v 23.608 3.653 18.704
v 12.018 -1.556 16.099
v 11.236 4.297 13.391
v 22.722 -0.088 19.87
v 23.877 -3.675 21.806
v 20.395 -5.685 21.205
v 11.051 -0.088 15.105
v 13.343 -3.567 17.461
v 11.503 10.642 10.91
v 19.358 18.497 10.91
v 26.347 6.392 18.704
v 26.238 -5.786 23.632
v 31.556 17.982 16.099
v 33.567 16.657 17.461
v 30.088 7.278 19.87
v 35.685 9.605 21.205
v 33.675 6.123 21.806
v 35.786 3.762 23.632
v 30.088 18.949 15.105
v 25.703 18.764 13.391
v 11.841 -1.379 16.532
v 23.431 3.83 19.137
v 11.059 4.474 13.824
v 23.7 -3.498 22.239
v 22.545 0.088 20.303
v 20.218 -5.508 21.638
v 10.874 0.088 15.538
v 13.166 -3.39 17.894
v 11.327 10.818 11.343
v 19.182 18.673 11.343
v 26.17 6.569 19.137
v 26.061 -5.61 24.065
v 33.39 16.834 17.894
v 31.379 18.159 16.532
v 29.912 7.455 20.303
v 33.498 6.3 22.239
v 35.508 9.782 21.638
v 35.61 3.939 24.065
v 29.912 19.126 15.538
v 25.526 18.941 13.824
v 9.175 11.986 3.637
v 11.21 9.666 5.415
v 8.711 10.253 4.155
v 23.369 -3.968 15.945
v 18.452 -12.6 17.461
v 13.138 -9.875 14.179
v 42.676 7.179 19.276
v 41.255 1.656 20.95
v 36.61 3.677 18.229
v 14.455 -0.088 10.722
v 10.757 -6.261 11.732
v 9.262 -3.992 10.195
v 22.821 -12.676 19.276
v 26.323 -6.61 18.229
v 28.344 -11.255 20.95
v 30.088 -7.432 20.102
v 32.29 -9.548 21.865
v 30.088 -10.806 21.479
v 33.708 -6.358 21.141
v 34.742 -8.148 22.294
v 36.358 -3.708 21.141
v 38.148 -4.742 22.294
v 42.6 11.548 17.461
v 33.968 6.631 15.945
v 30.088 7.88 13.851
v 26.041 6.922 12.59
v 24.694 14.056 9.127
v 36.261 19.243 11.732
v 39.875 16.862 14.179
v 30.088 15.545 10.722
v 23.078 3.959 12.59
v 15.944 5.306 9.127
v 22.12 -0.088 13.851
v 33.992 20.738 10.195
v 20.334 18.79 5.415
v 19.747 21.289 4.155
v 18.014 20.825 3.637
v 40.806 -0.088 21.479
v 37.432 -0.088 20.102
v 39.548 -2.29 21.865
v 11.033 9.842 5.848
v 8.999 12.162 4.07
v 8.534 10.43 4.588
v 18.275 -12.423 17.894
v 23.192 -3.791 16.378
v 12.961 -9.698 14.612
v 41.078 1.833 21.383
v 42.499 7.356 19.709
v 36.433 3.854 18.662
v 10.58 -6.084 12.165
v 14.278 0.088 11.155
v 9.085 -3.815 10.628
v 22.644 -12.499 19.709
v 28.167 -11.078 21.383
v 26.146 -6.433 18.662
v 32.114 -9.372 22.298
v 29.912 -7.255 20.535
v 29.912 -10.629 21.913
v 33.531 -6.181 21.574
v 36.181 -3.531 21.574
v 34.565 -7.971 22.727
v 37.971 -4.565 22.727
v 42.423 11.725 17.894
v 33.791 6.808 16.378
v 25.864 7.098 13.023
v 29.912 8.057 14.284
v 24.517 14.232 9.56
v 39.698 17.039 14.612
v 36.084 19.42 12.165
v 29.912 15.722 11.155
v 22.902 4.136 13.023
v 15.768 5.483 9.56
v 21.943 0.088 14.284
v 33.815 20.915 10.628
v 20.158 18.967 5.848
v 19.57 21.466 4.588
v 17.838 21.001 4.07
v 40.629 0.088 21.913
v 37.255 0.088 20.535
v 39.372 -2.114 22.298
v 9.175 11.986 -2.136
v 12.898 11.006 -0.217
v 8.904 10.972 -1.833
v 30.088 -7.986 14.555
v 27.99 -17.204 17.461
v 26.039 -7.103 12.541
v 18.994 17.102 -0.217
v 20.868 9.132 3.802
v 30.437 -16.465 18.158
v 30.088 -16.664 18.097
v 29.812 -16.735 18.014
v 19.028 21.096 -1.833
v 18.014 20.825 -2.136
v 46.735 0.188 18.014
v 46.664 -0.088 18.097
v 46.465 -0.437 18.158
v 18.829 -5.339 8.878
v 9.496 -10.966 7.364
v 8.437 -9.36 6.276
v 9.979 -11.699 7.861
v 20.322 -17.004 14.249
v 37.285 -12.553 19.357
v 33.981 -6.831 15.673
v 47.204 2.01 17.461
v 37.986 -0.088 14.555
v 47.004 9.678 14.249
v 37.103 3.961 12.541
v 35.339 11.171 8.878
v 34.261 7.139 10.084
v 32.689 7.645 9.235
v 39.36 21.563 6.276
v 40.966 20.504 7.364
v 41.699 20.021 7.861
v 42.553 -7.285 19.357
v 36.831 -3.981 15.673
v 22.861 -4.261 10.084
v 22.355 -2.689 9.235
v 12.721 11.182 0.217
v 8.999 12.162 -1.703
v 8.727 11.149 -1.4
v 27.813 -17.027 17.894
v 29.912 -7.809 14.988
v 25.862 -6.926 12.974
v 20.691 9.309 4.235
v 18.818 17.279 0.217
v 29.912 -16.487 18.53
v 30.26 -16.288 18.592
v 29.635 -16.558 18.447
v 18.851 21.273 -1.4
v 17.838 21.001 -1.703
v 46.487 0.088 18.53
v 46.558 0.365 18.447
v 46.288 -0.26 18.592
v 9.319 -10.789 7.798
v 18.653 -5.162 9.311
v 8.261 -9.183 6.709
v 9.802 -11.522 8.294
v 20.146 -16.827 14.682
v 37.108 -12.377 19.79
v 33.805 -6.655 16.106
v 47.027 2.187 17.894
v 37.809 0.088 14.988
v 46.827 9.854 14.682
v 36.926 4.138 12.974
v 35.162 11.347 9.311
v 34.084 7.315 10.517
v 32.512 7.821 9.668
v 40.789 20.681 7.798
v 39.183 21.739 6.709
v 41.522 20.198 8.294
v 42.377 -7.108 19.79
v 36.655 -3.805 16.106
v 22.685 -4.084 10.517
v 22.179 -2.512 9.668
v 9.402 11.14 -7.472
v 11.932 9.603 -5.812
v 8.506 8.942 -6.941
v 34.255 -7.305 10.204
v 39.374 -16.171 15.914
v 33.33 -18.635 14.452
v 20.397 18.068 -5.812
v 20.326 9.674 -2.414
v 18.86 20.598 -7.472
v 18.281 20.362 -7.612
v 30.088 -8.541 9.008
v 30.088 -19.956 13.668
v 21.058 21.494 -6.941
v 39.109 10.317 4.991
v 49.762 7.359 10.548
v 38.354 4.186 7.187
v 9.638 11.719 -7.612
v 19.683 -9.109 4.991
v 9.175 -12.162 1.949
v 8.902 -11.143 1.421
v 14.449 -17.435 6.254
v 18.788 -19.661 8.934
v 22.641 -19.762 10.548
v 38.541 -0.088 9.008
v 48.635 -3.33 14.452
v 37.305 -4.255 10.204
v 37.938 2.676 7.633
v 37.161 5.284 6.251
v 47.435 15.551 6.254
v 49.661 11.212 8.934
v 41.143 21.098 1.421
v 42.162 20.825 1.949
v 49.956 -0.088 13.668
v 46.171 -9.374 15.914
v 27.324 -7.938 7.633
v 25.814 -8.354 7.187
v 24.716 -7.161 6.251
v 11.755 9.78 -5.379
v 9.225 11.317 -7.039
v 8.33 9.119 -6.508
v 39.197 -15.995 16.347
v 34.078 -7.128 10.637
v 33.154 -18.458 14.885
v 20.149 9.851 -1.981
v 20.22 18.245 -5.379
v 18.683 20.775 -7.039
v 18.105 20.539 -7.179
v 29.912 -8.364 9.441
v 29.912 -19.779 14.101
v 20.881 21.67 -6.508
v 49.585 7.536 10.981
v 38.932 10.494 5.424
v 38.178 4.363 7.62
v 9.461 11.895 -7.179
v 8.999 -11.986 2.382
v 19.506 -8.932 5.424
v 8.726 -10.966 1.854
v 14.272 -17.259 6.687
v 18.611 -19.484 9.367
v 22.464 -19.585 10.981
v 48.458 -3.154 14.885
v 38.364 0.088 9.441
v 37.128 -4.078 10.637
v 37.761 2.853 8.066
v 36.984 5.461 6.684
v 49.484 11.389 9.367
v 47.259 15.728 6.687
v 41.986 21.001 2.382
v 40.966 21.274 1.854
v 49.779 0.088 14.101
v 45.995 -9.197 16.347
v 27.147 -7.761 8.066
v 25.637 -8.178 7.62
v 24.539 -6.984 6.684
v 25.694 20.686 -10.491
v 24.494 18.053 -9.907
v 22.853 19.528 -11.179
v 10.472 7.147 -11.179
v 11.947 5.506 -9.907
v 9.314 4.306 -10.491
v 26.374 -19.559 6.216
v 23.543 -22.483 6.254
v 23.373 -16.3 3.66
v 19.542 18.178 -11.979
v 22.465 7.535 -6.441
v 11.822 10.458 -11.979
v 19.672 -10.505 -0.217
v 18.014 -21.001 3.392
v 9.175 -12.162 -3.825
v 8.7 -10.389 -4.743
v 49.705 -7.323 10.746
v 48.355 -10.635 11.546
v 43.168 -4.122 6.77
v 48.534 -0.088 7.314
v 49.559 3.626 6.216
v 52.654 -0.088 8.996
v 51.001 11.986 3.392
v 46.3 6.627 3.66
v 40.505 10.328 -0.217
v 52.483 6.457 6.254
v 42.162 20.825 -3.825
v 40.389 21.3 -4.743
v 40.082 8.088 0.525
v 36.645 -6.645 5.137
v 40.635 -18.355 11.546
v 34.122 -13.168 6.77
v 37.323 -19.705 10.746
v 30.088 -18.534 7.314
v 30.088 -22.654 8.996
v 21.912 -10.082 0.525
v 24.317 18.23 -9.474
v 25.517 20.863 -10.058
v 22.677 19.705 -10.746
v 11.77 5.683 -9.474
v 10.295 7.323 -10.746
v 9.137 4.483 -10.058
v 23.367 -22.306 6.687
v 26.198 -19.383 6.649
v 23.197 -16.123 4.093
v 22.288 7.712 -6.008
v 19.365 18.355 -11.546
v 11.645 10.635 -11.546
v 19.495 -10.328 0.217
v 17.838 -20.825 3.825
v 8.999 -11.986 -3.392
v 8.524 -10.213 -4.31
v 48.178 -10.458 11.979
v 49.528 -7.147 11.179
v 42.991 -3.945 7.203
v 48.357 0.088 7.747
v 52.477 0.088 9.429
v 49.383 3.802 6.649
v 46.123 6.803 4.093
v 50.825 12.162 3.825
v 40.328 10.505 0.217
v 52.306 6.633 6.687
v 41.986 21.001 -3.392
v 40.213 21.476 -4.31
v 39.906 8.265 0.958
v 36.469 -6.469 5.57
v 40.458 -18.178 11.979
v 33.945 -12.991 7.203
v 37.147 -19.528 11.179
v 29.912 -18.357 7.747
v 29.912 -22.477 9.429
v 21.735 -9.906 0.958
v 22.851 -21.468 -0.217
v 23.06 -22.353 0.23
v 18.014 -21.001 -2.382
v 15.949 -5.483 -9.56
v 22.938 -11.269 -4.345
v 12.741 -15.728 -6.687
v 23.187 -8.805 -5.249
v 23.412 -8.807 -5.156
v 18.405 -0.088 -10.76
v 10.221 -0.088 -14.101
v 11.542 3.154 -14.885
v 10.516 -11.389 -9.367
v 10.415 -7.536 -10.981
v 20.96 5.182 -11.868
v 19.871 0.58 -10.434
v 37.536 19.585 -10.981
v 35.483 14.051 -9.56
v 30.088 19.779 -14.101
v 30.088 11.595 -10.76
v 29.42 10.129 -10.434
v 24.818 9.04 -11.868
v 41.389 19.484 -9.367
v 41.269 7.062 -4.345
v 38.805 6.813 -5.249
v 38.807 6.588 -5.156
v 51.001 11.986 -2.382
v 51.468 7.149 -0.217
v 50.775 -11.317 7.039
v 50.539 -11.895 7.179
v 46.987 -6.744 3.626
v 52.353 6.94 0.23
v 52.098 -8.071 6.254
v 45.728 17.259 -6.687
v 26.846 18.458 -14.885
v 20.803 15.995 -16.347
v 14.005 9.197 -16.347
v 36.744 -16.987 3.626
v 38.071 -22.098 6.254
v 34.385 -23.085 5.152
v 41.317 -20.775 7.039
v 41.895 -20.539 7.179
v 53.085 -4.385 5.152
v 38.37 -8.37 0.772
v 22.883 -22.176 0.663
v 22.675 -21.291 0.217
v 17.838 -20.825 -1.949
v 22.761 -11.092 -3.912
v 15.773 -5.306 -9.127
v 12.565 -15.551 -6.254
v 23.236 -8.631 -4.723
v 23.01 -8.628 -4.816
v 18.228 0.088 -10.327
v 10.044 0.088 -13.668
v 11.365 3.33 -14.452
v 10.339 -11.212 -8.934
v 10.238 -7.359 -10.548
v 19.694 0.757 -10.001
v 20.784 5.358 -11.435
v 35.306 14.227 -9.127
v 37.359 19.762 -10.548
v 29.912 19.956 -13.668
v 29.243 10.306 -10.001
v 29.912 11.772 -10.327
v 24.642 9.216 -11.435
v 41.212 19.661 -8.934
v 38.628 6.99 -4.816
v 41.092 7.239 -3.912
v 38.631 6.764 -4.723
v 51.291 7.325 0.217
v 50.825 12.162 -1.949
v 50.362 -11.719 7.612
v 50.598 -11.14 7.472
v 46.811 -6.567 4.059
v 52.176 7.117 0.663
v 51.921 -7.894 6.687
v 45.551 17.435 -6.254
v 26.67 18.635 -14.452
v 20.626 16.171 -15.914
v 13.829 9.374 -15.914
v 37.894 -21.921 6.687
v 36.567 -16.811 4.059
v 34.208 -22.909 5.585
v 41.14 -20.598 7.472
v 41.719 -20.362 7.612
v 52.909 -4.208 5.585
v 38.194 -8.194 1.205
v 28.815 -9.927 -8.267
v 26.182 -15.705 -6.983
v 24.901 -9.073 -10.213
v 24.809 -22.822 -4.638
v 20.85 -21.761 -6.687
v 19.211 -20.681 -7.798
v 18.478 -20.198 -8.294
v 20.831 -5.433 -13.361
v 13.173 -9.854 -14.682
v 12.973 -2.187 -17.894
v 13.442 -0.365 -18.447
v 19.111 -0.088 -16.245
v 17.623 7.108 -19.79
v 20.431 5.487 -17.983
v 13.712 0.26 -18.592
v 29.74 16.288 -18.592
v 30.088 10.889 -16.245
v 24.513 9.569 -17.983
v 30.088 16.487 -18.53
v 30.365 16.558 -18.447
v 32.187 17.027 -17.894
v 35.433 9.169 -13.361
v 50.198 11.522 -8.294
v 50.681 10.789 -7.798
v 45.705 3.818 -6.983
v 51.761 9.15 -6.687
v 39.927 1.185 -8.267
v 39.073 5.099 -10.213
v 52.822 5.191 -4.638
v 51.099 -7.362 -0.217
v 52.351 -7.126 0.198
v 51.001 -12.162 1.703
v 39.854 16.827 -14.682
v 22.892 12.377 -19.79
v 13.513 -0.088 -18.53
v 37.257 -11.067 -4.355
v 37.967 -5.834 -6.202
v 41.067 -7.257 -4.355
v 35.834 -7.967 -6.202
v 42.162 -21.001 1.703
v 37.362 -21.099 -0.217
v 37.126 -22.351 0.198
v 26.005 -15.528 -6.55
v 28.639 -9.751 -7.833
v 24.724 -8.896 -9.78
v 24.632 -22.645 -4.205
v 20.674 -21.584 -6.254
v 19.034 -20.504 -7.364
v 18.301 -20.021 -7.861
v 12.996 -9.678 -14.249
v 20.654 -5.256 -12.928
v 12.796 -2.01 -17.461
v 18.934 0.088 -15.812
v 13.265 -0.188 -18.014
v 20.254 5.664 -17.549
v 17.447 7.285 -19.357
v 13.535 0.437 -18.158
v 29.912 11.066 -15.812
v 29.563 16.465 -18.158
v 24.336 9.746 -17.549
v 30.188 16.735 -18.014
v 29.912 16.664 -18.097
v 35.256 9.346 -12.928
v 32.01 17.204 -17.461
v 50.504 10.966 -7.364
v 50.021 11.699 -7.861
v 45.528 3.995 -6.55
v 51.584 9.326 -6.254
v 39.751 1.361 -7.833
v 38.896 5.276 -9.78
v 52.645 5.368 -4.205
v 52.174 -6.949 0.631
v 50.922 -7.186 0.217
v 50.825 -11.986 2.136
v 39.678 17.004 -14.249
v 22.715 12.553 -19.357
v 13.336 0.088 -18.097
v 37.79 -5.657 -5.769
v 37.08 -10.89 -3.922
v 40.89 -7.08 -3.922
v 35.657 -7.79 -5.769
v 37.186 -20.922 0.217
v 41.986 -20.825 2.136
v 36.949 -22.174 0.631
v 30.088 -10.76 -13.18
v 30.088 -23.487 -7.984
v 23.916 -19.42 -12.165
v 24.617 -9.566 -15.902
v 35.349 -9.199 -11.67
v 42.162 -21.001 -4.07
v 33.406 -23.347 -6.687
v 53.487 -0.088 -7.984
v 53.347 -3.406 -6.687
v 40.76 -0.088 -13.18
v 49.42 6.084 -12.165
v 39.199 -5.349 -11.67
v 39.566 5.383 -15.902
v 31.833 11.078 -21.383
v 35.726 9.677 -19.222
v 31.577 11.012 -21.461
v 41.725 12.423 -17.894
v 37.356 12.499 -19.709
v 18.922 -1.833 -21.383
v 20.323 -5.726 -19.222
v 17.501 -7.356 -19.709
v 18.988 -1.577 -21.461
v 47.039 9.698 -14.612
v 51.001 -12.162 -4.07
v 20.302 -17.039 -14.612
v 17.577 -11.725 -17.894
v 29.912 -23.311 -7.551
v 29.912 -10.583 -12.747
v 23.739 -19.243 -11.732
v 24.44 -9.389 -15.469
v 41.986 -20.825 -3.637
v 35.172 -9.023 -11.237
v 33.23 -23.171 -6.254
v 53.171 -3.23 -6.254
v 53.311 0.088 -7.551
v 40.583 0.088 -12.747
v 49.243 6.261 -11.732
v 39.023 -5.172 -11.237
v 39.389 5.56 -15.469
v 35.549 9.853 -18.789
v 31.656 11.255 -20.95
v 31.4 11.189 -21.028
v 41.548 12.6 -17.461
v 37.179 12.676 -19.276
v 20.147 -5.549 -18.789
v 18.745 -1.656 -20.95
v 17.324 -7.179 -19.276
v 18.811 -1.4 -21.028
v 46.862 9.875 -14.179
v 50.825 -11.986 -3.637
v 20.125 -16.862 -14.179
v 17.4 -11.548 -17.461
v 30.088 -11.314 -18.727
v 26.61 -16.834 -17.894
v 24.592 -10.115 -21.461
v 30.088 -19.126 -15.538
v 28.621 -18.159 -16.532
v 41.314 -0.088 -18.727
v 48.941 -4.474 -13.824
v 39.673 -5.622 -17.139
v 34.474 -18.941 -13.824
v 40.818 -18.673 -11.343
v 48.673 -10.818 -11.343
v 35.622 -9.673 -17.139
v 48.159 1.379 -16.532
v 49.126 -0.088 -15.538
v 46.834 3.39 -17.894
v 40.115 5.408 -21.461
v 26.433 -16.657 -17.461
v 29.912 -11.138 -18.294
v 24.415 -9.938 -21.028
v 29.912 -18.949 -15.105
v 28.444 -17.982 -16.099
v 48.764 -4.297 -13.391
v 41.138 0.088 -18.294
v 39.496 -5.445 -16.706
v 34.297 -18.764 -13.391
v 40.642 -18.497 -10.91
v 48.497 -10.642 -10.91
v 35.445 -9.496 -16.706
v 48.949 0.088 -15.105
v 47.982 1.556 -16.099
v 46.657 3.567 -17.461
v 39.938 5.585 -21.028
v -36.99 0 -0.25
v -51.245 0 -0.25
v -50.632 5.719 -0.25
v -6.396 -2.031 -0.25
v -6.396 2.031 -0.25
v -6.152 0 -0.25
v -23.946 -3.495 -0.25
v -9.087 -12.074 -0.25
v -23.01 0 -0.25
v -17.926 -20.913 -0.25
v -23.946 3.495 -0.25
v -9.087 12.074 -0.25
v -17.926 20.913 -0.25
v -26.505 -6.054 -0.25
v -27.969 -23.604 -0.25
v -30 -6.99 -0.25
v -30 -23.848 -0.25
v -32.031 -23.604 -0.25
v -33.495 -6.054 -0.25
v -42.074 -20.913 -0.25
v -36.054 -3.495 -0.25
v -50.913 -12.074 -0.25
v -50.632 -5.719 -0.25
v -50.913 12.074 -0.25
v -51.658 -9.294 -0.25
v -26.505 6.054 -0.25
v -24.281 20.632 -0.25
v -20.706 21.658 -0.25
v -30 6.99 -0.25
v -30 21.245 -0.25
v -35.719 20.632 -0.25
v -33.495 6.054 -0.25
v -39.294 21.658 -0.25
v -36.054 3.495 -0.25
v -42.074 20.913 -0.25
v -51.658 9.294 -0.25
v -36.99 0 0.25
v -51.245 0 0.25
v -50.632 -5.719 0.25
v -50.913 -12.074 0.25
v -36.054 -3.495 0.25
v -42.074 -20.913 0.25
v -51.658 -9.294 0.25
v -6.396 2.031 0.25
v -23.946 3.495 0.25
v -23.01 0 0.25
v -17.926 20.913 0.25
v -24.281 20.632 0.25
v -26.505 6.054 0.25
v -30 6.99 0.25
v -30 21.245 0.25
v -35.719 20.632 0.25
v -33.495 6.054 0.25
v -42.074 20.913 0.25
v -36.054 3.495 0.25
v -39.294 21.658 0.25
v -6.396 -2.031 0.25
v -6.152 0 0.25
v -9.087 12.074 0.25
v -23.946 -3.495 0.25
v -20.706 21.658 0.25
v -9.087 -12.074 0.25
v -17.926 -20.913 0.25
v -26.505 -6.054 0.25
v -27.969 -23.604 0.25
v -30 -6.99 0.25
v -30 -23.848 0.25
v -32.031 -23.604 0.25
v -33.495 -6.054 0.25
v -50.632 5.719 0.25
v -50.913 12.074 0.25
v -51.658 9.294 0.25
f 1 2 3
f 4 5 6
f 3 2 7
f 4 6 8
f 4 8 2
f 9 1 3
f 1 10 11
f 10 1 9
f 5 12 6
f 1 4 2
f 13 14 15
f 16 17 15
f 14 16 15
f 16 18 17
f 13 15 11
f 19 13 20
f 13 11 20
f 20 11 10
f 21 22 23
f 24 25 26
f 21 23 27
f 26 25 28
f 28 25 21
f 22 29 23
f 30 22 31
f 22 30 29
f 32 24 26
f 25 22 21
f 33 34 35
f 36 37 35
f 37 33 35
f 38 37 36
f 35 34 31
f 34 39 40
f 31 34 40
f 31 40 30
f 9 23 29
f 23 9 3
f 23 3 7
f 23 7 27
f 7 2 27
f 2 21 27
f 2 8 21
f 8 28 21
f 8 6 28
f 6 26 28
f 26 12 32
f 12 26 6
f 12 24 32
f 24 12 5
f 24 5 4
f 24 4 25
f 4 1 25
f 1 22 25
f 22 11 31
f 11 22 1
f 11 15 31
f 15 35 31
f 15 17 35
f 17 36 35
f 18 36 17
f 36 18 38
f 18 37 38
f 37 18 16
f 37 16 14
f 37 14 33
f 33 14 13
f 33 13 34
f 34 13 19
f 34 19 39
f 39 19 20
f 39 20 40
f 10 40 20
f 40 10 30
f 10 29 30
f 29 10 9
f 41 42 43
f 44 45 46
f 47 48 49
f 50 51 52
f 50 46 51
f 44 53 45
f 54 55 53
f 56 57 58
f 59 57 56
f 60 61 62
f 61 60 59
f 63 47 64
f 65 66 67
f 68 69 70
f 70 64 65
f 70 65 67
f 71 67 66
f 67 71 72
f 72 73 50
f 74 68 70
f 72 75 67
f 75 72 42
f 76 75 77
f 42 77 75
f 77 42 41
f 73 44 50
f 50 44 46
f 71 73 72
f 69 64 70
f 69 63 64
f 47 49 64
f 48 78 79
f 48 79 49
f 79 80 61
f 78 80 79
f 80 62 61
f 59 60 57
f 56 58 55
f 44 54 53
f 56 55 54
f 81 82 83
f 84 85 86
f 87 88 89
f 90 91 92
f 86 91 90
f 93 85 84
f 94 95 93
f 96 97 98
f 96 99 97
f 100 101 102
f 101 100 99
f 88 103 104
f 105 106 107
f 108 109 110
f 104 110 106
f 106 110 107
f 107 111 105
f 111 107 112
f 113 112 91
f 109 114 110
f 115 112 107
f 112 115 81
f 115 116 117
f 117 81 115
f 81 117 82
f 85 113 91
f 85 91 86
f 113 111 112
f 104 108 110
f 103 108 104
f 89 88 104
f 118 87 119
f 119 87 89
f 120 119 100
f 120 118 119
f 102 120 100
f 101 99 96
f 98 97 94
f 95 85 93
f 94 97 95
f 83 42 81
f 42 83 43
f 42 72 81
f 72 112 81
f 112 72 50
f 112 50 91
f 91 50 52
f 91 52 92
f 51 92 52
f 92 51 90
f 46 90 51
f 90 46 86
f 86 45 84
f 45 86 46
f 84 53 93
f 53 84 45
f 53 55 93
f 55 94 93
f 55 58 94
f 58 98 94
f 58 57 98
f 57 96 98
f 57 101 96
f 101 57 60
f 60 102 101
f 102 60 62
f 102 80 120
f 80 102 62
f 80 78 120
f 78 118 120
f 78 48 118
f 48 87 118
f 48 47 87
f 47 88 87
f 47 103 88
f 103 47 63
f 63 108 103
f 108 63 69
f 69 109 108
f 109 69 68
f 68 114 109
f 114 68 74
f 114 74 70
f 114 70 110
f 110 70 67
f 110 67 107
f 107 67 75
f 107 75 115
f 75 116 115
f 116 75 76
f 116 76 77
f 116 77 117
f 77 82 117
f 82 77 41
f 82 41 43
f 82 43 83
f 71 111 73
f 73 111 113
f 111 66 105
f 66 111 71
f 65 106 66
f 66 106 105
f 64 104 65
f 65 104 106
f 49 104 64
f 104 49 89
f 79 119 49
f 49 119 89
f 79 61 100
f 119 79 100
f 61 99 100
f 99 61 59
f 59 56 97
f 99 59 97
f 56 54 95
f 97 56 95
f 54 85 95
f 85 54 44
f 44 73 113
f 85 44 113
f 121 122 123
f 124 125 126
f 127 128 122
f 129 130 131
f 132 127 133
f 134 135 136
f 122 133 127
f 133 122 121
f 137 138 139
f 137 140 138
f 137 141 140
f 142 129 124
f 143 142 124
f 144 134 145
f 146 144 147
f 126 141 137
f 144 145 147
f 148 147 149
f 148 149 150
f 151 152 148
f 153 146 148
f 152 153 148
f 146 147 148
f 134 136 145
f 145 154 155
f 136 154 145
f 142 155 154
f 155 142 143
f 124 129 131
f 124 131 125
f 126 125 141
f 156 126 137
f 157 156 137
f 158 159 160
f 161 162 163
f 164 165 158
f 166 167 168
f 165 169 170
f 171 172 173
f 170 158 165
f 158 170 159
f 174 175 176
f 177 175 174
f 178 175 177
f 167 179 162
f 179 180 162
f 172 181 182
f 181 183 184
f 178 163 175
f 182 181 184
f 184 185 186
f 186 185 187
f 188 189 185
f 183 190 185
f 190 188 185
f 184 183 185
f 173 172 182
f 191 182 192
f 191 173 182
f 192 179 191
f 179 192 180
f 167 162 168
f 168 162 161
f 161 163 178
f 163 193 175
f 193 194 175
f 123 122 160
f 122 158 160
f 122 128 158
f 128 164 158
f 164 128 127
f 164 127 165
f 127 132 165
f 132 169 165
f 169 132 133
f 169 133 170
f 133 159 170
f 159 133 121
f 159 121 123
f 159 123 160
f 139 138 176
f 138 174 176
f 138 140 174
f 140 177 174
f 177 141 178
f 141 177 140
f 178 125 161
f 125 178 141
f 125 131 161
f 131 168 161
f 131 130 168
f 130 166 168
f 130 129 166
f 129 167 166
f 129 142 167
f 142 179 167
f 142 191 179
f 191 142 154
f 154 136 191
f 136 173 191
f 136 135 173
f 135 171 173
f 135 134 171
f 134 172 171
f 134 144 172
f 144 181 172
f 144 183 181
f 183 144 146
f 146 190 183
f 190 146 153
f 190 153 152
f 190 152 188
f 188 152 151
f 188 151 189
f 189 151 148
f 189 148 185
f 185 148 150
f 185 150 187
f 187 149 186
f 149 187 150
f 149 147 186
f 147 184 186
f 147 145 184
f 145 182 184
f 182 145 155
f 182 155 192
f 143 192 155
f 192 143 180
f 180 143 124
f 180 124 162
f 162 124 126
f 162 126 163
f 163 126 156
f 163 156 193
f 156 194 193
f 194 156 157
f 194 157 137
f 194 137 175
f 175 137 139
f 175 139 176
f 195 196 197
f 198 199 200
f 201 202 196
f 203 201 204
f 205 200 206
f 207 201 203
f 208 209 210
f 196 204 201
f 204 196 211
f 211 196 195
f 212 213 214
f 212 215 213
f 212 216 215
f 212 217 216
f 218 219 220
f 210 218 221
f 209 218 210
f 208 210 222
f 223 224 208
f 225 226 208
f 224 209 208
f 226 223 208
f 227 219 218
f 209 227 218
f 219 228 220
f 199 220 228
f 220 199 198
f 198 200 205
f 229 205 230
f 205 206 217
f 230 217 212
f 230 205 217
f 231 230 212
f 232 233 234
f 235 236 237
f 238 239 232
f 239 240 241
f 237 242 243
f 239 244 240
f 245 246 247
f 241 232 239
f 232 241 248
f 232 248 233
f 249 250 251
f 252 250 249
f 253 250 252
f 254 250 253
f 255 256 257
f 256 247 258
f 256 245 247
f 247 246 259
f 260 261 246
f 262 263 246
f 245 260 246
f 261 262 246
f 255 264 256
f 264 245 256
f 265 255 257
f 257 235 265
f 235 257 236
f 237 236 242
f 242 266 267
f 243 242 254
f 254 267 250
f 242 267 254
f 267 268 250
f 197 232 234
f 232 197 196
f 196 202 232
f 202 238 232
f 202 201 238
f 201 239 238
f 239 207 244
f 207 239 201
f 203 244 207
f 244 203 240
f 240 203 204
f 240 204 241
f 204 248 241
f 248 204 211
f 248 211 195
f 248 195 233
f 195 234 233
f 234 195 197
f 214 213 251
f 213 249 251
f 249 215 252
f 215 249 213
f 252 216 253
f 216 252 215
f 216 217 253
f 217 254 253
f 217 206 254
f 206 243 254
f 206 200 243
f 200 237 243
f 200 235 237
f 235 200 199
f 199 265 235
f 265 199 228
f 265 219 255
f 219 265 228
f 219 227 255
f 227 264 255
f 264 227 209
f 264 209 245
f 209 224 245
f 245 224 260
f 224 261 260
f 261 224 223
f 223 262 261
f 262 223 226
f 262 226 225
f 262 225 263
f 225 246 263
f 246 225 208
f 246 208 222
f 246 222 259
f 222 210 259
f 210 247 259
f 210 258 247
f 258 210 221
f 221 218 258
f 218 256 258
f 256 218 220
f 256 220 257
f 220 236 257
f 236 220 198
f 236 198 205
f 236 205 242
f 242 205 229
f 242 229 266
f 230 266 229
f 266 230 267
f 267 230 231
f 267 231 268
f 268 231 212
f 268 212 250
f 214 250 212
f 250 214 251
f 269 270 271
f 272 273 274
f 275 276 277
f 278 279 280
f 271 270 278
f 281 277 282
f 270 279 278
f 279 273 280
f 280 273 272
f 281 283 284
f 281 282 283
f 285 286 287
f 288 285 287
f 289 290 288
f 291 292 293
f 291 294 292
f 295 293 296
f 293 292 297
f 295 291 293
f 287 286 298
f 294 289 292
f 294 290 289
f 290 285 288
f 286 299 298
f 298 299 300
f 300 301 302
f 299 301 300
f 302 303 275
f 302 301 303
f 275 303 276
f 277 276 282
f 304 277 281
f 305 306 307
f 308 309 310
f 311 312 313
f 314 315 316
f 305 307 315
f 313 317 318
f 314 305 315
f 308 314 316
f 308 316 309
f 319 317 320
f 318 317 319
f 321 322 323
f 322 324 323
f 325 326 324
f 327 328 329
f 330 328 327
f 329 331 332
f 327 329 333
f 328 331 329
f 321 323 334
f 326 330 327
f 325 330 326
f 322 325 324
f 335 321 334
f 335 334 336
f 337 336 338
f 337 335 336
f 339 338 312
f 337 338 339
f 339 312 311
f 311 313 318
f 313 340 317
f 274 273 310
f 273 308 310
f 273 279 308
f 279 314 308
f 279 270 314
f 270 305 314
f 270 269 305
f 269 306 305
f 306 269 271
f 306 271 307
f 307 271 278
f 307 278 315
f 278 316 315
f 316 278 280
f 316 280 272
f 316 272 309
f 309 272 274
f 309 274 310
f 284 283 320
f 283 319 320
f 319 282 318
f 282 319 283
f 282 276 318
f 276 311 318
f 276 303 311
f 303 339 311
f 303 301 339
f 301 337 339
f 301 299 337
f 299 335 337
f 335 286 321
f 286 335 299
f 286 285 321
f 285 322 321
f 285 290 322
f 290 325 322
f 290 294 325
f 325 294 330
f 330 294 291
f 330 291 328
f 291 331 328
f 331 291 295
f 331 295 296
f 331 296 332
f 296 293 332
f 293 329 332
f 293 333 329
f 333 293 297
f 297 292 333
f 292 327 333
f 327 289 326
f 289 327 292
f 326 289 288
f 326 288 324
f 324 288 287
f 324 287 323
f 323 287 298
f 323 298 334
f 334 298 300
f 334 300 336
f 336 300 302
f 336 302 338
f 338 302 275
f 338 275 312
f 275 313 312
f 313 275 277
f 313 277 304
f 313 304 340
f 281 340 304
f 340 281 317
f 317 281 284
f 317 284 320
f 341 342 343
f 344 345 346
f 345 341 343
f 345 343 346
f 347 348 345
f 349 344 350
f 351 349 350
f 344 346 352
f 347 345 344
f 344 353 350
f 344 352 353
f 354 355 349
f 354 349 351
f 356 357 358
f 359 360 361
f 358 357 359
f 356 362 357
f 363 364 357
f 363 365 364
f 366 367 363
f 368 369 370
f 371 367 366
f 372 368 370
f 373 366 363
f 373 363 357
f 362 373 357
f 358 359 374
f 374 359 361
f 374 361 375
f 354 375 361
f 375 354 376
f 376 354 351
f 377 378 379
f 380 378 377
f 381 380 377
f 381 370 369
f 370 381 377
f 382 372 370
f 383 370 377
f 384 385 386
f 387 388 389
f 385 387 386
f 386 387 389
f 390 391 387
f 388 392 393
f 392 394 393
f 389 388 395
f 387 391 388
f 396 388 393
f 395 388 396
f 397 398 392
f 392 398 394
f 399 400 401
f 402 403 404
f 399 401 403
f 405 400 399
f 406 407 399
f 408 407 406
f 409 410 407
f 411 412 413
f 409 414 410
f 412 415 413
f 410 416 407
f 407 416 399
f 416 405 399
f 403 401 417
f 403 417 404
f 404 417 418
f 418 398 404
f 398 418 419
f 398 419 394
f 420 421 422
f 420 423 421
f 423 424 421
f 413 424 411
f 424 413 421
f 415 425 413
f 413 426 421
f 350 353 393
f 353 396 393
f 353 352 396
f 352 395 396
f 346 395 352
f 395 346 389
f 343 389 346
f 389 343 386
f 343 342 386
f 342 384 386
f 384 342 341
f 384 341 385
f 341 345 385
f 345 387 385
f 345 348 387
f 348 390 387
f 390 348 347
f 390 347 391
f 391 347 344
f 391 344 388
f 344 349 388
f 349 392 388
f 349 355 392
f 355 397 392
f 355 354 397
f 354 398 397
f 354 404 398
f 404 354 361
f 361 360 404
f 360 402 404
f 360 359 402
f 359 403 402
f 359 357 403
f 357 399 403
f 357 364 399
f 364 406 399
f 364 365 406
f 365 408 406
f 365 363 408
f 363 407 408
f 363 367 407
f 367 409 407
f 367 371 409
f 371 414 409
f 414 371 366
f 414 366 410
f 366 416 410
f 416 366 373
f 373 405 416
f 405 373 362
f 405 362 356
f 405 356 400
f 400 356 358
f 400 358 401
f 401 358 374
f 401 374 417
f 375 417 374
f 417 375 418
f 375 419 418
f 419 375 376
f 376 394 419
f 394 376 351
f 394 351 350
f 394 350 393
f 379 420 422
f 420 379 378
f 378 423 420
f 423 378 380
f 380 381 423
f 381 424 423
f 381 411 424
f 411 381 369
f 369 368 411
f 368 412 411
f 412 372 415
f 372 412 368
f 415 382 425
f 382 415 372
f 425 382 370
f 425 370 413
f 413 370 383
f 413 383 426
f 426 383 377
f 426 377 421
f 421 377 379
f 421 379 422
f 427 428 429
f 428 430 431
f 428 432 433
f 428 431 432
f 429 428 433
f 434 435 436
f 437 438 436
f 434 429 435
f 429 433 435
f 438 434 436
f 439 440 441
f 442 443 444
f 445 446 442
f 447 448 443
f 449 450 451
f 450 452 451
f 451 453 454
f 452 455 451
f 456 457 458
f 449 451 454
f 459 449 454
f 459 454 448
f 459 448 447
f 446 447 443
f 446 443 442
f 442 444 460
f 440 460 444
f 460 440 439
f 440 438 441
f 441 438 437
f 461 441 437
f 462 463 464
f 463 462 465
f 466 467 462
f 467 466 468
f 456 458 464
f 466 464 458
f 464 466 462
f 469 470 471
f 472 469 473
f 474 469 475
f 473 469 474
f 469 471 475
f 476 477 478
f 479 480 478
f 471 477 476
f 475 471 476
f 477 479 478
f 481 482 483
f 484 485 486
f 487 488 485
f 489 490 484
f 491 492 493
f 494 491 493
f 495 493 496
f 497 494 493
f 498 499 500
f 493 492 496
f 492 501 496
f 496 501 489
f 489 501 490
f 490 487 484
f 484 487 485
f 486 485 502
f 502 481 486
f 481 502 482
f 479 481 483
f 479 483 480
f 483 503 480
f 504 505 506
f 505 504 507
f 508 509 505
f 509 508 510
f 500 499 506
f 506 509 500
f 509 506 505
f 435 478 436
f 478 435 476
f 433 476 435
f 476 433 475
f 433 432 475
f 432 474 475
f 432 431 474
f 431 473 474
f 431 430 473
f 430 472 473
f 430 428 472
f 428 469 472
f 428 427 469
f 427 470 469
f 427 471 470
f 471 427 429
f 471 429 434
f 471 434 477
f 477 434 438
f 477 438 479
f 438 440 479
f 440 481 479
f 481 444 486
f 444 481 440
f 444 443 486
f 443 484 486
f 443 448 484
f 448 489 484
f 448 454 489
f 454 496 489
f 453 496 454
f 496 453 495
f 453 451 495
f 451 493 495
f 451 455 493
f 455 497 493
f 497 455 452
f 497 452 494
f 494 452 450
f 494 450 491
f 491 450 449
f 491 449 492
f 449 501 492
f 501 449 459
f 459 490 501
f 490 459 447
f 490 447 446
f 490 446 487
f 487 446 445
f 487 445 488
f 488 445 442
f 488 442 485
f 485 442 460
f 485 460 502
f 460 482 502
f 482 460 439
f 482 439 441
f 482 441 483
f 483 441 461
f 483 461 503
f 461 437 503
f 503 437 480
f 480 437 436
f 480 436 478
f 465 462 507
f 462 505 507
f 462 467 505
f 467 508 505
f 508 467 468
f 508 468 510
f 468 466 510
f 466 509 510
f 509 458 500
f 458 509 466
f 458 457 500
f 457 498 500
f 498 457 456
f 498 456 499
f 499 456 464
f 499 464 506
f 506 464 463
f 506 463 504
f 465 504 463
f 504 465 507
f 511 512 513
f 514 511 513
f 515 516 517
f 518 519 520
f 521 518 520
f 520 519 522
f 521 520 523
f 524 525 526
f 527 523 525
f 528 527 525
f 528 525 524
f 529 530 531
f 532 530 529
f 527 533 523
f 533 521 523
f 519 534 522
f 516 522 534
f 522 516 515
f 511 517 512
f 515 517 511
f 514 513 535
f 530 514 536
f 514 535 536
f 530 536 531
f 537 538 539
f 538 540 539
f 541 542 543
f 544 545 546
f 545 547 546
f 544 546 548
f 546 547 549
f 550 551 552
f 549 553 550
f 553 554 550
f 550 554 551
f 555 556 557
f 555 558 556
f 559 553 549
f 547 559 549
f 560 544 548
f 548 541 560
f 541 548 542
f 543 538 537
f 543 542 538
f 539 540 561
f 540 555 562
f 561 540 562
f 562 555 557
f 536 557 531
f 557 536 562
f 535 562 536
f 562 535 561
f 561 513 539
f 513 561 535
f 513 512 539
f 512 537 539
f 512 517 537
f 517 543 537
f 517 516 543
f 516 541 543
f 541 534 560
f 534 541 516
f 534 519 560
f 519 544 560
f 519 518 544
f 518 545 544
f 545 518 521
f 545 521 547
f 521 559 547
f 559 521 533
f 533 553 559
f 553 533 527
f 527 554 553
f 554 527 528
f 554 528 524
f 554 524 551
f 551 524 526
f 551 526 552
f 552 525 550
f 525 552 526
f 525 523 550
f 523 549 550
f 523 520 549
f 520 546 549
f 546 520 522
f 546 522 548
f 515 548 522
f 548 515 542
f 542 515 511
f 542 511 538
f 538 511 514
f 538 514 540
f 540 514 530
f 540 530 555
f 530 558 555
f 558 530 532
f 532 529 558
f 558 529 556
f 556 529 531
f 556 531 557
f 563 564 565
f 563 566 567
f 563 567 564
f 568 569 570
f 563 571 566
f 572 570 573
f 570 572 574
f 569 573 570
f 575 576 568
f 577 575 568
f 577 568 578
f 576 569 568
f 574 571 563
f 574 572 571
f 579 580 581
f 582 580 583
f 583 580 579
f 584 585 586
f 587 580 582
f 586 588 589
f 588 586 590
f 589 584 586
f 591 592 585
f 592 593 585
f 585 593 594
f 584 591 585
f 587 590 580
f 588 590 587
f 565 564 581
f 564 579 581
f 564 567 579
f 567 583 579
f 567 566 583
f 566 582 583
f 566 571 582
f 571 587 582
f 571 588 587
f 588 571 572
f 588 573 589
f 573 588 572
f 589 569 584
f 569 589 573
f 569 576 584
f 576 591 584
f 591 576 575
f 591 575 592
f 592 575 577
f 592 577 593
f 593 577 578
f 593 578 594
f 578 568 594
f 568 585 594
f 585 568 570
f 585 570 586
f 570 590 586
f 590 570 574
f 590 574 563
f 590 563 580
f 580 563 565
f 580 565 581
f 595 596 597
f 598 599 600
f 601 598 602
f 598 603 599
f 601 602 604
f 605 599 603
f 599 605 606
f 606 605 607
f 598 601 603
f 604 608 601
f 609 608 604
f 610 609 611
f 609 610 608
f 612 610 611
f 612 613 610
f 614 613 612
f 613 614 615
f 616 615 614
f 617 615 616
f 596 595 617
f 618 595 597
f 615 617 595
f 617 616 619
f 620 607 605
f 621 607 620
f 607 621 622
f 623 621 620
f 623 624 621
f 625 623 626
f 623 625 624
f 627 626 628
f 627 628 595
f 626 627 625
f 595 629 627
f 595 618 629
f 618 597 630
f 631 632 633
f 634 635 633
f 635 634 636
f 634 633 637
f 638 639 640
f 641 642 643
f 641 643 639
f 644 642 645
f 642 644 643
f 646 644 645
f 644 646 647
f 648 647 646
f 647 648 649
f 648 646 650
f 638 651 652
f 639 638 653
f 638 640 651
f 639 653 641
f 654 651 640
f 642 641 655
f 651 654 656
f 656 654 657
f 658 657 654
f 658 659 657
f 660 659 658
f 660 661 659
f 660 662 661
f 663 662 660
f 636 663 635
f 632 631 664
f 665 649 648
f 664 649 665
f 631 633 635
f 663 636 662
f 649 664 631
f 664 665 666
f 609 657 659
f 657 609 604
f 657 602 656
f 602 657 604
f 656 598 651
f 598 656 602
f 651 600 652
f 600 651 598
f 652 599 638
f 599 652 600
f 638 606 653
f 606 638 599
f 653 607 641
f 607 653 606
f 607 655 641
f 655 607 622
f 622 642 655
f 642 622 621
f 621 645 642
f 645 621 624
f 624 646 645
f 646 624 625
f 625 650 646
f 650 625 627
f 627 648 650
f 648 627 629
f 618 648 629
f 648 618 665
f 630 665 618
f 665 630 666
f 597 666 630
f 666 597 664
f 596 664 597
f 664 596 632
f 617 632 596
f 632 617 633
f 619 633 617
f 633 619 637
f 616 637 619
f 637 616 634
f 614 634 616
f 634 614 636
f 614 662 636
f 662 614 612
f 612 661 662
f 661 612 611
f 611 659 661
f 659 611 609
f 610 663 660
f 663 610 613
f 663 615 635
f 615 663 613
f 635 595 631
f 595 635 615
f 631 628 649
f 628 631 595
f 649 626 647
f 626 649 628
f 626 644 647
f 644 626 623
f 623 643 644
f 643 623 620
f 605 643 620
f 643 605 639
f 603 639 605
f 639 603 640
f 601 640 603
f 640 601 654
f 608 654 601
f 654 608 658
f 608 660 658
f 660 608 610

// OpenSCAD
module thing()
{
  $fa = 30;
  difference() {
    sphere(r = 25);
    cylinder(h = 62.5, r1 = 12.5, r2 = 6.25, center = true);
    rotate(90, [ 1, 0, 0 ]) cylinder(h = 62.5,
        r1 = 12.5, r2 = 6.25, center = true);
    rotate(90, [ 0, 1, 0 ]) cylinder(h = 62.5,
        r1 = 12.5, r2 = 6.25, center = true);
  }
}

module demo_proj()
{
  linear_extrude(center = true, height = 0.5) projection(cut = false) thing();
  % thing();
}

module demo_cut()
{
  for (i=[-20:5:+20]) {
     rotate(-30, [ 1, 1, 0 ]) translate([ 0, 0, -i ])
      linear_extrude(center = true, height = 0.5) projection(cut = true)
        translate([ 0, 0, i ]) rotate(+30, [ 1, 1, 0 ]) thing();
  }
  % thing();
}

echo(version=version());
translate([ -30, 0, 0 ]) demo_proj();
translate([ +30, 0, 0 ]) demo_cut();

// Written by Clifford Wolf <clifford@clifford.at> and Marius
// Kintel <marius@kintel.net>
//
// To the extent possible under law, the author(s) have dedicated all
// copyright and related and neighboring rights to this software to the
// public domain worldwide. This software is distributed without any
// warranty.
//
// You should have received a copy of the CC0 Public Domain
// Dedication along with this software.
// If not, see <http://creativecommons.org/publicdomain/zero/1.0/>.
